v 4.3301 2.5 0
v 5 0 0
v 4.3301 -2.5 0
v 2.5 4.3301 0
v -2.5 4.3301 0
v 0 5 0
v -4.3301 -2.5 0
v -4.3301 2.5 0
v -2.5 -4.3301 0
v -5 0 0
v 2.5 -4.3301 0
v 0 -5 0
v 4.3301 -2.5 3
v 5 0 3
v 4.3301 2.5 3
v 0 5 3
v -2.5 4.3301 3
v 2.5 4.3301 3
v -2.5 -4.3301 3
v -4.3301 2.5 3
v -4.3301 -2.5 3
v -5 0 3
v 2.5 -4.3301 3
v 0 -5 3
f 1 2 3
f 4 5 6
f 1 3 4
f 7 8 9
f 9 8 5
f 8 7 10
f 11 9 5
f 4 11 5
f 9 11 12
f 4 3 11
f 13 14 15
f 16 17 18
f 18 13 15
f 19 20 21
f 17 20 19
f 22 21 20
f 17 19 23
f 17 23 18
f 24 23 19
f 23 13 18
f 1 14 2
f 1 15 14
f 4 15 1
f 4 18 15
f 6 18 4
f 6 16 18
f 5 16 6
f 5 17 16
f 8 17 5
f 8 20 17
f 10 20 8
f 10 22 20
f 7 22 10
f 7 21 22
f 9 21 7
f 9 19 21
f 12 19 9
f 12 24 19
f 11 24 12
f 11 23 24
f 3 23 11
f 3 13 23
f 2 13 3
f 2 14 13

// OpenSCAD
// Generated by scadwright. Do not hand-edit —
// edit the Python source and regenerate.

$fn = 12;

linear_extrude(height=3, center=false) {
    circle(r=5);
}
